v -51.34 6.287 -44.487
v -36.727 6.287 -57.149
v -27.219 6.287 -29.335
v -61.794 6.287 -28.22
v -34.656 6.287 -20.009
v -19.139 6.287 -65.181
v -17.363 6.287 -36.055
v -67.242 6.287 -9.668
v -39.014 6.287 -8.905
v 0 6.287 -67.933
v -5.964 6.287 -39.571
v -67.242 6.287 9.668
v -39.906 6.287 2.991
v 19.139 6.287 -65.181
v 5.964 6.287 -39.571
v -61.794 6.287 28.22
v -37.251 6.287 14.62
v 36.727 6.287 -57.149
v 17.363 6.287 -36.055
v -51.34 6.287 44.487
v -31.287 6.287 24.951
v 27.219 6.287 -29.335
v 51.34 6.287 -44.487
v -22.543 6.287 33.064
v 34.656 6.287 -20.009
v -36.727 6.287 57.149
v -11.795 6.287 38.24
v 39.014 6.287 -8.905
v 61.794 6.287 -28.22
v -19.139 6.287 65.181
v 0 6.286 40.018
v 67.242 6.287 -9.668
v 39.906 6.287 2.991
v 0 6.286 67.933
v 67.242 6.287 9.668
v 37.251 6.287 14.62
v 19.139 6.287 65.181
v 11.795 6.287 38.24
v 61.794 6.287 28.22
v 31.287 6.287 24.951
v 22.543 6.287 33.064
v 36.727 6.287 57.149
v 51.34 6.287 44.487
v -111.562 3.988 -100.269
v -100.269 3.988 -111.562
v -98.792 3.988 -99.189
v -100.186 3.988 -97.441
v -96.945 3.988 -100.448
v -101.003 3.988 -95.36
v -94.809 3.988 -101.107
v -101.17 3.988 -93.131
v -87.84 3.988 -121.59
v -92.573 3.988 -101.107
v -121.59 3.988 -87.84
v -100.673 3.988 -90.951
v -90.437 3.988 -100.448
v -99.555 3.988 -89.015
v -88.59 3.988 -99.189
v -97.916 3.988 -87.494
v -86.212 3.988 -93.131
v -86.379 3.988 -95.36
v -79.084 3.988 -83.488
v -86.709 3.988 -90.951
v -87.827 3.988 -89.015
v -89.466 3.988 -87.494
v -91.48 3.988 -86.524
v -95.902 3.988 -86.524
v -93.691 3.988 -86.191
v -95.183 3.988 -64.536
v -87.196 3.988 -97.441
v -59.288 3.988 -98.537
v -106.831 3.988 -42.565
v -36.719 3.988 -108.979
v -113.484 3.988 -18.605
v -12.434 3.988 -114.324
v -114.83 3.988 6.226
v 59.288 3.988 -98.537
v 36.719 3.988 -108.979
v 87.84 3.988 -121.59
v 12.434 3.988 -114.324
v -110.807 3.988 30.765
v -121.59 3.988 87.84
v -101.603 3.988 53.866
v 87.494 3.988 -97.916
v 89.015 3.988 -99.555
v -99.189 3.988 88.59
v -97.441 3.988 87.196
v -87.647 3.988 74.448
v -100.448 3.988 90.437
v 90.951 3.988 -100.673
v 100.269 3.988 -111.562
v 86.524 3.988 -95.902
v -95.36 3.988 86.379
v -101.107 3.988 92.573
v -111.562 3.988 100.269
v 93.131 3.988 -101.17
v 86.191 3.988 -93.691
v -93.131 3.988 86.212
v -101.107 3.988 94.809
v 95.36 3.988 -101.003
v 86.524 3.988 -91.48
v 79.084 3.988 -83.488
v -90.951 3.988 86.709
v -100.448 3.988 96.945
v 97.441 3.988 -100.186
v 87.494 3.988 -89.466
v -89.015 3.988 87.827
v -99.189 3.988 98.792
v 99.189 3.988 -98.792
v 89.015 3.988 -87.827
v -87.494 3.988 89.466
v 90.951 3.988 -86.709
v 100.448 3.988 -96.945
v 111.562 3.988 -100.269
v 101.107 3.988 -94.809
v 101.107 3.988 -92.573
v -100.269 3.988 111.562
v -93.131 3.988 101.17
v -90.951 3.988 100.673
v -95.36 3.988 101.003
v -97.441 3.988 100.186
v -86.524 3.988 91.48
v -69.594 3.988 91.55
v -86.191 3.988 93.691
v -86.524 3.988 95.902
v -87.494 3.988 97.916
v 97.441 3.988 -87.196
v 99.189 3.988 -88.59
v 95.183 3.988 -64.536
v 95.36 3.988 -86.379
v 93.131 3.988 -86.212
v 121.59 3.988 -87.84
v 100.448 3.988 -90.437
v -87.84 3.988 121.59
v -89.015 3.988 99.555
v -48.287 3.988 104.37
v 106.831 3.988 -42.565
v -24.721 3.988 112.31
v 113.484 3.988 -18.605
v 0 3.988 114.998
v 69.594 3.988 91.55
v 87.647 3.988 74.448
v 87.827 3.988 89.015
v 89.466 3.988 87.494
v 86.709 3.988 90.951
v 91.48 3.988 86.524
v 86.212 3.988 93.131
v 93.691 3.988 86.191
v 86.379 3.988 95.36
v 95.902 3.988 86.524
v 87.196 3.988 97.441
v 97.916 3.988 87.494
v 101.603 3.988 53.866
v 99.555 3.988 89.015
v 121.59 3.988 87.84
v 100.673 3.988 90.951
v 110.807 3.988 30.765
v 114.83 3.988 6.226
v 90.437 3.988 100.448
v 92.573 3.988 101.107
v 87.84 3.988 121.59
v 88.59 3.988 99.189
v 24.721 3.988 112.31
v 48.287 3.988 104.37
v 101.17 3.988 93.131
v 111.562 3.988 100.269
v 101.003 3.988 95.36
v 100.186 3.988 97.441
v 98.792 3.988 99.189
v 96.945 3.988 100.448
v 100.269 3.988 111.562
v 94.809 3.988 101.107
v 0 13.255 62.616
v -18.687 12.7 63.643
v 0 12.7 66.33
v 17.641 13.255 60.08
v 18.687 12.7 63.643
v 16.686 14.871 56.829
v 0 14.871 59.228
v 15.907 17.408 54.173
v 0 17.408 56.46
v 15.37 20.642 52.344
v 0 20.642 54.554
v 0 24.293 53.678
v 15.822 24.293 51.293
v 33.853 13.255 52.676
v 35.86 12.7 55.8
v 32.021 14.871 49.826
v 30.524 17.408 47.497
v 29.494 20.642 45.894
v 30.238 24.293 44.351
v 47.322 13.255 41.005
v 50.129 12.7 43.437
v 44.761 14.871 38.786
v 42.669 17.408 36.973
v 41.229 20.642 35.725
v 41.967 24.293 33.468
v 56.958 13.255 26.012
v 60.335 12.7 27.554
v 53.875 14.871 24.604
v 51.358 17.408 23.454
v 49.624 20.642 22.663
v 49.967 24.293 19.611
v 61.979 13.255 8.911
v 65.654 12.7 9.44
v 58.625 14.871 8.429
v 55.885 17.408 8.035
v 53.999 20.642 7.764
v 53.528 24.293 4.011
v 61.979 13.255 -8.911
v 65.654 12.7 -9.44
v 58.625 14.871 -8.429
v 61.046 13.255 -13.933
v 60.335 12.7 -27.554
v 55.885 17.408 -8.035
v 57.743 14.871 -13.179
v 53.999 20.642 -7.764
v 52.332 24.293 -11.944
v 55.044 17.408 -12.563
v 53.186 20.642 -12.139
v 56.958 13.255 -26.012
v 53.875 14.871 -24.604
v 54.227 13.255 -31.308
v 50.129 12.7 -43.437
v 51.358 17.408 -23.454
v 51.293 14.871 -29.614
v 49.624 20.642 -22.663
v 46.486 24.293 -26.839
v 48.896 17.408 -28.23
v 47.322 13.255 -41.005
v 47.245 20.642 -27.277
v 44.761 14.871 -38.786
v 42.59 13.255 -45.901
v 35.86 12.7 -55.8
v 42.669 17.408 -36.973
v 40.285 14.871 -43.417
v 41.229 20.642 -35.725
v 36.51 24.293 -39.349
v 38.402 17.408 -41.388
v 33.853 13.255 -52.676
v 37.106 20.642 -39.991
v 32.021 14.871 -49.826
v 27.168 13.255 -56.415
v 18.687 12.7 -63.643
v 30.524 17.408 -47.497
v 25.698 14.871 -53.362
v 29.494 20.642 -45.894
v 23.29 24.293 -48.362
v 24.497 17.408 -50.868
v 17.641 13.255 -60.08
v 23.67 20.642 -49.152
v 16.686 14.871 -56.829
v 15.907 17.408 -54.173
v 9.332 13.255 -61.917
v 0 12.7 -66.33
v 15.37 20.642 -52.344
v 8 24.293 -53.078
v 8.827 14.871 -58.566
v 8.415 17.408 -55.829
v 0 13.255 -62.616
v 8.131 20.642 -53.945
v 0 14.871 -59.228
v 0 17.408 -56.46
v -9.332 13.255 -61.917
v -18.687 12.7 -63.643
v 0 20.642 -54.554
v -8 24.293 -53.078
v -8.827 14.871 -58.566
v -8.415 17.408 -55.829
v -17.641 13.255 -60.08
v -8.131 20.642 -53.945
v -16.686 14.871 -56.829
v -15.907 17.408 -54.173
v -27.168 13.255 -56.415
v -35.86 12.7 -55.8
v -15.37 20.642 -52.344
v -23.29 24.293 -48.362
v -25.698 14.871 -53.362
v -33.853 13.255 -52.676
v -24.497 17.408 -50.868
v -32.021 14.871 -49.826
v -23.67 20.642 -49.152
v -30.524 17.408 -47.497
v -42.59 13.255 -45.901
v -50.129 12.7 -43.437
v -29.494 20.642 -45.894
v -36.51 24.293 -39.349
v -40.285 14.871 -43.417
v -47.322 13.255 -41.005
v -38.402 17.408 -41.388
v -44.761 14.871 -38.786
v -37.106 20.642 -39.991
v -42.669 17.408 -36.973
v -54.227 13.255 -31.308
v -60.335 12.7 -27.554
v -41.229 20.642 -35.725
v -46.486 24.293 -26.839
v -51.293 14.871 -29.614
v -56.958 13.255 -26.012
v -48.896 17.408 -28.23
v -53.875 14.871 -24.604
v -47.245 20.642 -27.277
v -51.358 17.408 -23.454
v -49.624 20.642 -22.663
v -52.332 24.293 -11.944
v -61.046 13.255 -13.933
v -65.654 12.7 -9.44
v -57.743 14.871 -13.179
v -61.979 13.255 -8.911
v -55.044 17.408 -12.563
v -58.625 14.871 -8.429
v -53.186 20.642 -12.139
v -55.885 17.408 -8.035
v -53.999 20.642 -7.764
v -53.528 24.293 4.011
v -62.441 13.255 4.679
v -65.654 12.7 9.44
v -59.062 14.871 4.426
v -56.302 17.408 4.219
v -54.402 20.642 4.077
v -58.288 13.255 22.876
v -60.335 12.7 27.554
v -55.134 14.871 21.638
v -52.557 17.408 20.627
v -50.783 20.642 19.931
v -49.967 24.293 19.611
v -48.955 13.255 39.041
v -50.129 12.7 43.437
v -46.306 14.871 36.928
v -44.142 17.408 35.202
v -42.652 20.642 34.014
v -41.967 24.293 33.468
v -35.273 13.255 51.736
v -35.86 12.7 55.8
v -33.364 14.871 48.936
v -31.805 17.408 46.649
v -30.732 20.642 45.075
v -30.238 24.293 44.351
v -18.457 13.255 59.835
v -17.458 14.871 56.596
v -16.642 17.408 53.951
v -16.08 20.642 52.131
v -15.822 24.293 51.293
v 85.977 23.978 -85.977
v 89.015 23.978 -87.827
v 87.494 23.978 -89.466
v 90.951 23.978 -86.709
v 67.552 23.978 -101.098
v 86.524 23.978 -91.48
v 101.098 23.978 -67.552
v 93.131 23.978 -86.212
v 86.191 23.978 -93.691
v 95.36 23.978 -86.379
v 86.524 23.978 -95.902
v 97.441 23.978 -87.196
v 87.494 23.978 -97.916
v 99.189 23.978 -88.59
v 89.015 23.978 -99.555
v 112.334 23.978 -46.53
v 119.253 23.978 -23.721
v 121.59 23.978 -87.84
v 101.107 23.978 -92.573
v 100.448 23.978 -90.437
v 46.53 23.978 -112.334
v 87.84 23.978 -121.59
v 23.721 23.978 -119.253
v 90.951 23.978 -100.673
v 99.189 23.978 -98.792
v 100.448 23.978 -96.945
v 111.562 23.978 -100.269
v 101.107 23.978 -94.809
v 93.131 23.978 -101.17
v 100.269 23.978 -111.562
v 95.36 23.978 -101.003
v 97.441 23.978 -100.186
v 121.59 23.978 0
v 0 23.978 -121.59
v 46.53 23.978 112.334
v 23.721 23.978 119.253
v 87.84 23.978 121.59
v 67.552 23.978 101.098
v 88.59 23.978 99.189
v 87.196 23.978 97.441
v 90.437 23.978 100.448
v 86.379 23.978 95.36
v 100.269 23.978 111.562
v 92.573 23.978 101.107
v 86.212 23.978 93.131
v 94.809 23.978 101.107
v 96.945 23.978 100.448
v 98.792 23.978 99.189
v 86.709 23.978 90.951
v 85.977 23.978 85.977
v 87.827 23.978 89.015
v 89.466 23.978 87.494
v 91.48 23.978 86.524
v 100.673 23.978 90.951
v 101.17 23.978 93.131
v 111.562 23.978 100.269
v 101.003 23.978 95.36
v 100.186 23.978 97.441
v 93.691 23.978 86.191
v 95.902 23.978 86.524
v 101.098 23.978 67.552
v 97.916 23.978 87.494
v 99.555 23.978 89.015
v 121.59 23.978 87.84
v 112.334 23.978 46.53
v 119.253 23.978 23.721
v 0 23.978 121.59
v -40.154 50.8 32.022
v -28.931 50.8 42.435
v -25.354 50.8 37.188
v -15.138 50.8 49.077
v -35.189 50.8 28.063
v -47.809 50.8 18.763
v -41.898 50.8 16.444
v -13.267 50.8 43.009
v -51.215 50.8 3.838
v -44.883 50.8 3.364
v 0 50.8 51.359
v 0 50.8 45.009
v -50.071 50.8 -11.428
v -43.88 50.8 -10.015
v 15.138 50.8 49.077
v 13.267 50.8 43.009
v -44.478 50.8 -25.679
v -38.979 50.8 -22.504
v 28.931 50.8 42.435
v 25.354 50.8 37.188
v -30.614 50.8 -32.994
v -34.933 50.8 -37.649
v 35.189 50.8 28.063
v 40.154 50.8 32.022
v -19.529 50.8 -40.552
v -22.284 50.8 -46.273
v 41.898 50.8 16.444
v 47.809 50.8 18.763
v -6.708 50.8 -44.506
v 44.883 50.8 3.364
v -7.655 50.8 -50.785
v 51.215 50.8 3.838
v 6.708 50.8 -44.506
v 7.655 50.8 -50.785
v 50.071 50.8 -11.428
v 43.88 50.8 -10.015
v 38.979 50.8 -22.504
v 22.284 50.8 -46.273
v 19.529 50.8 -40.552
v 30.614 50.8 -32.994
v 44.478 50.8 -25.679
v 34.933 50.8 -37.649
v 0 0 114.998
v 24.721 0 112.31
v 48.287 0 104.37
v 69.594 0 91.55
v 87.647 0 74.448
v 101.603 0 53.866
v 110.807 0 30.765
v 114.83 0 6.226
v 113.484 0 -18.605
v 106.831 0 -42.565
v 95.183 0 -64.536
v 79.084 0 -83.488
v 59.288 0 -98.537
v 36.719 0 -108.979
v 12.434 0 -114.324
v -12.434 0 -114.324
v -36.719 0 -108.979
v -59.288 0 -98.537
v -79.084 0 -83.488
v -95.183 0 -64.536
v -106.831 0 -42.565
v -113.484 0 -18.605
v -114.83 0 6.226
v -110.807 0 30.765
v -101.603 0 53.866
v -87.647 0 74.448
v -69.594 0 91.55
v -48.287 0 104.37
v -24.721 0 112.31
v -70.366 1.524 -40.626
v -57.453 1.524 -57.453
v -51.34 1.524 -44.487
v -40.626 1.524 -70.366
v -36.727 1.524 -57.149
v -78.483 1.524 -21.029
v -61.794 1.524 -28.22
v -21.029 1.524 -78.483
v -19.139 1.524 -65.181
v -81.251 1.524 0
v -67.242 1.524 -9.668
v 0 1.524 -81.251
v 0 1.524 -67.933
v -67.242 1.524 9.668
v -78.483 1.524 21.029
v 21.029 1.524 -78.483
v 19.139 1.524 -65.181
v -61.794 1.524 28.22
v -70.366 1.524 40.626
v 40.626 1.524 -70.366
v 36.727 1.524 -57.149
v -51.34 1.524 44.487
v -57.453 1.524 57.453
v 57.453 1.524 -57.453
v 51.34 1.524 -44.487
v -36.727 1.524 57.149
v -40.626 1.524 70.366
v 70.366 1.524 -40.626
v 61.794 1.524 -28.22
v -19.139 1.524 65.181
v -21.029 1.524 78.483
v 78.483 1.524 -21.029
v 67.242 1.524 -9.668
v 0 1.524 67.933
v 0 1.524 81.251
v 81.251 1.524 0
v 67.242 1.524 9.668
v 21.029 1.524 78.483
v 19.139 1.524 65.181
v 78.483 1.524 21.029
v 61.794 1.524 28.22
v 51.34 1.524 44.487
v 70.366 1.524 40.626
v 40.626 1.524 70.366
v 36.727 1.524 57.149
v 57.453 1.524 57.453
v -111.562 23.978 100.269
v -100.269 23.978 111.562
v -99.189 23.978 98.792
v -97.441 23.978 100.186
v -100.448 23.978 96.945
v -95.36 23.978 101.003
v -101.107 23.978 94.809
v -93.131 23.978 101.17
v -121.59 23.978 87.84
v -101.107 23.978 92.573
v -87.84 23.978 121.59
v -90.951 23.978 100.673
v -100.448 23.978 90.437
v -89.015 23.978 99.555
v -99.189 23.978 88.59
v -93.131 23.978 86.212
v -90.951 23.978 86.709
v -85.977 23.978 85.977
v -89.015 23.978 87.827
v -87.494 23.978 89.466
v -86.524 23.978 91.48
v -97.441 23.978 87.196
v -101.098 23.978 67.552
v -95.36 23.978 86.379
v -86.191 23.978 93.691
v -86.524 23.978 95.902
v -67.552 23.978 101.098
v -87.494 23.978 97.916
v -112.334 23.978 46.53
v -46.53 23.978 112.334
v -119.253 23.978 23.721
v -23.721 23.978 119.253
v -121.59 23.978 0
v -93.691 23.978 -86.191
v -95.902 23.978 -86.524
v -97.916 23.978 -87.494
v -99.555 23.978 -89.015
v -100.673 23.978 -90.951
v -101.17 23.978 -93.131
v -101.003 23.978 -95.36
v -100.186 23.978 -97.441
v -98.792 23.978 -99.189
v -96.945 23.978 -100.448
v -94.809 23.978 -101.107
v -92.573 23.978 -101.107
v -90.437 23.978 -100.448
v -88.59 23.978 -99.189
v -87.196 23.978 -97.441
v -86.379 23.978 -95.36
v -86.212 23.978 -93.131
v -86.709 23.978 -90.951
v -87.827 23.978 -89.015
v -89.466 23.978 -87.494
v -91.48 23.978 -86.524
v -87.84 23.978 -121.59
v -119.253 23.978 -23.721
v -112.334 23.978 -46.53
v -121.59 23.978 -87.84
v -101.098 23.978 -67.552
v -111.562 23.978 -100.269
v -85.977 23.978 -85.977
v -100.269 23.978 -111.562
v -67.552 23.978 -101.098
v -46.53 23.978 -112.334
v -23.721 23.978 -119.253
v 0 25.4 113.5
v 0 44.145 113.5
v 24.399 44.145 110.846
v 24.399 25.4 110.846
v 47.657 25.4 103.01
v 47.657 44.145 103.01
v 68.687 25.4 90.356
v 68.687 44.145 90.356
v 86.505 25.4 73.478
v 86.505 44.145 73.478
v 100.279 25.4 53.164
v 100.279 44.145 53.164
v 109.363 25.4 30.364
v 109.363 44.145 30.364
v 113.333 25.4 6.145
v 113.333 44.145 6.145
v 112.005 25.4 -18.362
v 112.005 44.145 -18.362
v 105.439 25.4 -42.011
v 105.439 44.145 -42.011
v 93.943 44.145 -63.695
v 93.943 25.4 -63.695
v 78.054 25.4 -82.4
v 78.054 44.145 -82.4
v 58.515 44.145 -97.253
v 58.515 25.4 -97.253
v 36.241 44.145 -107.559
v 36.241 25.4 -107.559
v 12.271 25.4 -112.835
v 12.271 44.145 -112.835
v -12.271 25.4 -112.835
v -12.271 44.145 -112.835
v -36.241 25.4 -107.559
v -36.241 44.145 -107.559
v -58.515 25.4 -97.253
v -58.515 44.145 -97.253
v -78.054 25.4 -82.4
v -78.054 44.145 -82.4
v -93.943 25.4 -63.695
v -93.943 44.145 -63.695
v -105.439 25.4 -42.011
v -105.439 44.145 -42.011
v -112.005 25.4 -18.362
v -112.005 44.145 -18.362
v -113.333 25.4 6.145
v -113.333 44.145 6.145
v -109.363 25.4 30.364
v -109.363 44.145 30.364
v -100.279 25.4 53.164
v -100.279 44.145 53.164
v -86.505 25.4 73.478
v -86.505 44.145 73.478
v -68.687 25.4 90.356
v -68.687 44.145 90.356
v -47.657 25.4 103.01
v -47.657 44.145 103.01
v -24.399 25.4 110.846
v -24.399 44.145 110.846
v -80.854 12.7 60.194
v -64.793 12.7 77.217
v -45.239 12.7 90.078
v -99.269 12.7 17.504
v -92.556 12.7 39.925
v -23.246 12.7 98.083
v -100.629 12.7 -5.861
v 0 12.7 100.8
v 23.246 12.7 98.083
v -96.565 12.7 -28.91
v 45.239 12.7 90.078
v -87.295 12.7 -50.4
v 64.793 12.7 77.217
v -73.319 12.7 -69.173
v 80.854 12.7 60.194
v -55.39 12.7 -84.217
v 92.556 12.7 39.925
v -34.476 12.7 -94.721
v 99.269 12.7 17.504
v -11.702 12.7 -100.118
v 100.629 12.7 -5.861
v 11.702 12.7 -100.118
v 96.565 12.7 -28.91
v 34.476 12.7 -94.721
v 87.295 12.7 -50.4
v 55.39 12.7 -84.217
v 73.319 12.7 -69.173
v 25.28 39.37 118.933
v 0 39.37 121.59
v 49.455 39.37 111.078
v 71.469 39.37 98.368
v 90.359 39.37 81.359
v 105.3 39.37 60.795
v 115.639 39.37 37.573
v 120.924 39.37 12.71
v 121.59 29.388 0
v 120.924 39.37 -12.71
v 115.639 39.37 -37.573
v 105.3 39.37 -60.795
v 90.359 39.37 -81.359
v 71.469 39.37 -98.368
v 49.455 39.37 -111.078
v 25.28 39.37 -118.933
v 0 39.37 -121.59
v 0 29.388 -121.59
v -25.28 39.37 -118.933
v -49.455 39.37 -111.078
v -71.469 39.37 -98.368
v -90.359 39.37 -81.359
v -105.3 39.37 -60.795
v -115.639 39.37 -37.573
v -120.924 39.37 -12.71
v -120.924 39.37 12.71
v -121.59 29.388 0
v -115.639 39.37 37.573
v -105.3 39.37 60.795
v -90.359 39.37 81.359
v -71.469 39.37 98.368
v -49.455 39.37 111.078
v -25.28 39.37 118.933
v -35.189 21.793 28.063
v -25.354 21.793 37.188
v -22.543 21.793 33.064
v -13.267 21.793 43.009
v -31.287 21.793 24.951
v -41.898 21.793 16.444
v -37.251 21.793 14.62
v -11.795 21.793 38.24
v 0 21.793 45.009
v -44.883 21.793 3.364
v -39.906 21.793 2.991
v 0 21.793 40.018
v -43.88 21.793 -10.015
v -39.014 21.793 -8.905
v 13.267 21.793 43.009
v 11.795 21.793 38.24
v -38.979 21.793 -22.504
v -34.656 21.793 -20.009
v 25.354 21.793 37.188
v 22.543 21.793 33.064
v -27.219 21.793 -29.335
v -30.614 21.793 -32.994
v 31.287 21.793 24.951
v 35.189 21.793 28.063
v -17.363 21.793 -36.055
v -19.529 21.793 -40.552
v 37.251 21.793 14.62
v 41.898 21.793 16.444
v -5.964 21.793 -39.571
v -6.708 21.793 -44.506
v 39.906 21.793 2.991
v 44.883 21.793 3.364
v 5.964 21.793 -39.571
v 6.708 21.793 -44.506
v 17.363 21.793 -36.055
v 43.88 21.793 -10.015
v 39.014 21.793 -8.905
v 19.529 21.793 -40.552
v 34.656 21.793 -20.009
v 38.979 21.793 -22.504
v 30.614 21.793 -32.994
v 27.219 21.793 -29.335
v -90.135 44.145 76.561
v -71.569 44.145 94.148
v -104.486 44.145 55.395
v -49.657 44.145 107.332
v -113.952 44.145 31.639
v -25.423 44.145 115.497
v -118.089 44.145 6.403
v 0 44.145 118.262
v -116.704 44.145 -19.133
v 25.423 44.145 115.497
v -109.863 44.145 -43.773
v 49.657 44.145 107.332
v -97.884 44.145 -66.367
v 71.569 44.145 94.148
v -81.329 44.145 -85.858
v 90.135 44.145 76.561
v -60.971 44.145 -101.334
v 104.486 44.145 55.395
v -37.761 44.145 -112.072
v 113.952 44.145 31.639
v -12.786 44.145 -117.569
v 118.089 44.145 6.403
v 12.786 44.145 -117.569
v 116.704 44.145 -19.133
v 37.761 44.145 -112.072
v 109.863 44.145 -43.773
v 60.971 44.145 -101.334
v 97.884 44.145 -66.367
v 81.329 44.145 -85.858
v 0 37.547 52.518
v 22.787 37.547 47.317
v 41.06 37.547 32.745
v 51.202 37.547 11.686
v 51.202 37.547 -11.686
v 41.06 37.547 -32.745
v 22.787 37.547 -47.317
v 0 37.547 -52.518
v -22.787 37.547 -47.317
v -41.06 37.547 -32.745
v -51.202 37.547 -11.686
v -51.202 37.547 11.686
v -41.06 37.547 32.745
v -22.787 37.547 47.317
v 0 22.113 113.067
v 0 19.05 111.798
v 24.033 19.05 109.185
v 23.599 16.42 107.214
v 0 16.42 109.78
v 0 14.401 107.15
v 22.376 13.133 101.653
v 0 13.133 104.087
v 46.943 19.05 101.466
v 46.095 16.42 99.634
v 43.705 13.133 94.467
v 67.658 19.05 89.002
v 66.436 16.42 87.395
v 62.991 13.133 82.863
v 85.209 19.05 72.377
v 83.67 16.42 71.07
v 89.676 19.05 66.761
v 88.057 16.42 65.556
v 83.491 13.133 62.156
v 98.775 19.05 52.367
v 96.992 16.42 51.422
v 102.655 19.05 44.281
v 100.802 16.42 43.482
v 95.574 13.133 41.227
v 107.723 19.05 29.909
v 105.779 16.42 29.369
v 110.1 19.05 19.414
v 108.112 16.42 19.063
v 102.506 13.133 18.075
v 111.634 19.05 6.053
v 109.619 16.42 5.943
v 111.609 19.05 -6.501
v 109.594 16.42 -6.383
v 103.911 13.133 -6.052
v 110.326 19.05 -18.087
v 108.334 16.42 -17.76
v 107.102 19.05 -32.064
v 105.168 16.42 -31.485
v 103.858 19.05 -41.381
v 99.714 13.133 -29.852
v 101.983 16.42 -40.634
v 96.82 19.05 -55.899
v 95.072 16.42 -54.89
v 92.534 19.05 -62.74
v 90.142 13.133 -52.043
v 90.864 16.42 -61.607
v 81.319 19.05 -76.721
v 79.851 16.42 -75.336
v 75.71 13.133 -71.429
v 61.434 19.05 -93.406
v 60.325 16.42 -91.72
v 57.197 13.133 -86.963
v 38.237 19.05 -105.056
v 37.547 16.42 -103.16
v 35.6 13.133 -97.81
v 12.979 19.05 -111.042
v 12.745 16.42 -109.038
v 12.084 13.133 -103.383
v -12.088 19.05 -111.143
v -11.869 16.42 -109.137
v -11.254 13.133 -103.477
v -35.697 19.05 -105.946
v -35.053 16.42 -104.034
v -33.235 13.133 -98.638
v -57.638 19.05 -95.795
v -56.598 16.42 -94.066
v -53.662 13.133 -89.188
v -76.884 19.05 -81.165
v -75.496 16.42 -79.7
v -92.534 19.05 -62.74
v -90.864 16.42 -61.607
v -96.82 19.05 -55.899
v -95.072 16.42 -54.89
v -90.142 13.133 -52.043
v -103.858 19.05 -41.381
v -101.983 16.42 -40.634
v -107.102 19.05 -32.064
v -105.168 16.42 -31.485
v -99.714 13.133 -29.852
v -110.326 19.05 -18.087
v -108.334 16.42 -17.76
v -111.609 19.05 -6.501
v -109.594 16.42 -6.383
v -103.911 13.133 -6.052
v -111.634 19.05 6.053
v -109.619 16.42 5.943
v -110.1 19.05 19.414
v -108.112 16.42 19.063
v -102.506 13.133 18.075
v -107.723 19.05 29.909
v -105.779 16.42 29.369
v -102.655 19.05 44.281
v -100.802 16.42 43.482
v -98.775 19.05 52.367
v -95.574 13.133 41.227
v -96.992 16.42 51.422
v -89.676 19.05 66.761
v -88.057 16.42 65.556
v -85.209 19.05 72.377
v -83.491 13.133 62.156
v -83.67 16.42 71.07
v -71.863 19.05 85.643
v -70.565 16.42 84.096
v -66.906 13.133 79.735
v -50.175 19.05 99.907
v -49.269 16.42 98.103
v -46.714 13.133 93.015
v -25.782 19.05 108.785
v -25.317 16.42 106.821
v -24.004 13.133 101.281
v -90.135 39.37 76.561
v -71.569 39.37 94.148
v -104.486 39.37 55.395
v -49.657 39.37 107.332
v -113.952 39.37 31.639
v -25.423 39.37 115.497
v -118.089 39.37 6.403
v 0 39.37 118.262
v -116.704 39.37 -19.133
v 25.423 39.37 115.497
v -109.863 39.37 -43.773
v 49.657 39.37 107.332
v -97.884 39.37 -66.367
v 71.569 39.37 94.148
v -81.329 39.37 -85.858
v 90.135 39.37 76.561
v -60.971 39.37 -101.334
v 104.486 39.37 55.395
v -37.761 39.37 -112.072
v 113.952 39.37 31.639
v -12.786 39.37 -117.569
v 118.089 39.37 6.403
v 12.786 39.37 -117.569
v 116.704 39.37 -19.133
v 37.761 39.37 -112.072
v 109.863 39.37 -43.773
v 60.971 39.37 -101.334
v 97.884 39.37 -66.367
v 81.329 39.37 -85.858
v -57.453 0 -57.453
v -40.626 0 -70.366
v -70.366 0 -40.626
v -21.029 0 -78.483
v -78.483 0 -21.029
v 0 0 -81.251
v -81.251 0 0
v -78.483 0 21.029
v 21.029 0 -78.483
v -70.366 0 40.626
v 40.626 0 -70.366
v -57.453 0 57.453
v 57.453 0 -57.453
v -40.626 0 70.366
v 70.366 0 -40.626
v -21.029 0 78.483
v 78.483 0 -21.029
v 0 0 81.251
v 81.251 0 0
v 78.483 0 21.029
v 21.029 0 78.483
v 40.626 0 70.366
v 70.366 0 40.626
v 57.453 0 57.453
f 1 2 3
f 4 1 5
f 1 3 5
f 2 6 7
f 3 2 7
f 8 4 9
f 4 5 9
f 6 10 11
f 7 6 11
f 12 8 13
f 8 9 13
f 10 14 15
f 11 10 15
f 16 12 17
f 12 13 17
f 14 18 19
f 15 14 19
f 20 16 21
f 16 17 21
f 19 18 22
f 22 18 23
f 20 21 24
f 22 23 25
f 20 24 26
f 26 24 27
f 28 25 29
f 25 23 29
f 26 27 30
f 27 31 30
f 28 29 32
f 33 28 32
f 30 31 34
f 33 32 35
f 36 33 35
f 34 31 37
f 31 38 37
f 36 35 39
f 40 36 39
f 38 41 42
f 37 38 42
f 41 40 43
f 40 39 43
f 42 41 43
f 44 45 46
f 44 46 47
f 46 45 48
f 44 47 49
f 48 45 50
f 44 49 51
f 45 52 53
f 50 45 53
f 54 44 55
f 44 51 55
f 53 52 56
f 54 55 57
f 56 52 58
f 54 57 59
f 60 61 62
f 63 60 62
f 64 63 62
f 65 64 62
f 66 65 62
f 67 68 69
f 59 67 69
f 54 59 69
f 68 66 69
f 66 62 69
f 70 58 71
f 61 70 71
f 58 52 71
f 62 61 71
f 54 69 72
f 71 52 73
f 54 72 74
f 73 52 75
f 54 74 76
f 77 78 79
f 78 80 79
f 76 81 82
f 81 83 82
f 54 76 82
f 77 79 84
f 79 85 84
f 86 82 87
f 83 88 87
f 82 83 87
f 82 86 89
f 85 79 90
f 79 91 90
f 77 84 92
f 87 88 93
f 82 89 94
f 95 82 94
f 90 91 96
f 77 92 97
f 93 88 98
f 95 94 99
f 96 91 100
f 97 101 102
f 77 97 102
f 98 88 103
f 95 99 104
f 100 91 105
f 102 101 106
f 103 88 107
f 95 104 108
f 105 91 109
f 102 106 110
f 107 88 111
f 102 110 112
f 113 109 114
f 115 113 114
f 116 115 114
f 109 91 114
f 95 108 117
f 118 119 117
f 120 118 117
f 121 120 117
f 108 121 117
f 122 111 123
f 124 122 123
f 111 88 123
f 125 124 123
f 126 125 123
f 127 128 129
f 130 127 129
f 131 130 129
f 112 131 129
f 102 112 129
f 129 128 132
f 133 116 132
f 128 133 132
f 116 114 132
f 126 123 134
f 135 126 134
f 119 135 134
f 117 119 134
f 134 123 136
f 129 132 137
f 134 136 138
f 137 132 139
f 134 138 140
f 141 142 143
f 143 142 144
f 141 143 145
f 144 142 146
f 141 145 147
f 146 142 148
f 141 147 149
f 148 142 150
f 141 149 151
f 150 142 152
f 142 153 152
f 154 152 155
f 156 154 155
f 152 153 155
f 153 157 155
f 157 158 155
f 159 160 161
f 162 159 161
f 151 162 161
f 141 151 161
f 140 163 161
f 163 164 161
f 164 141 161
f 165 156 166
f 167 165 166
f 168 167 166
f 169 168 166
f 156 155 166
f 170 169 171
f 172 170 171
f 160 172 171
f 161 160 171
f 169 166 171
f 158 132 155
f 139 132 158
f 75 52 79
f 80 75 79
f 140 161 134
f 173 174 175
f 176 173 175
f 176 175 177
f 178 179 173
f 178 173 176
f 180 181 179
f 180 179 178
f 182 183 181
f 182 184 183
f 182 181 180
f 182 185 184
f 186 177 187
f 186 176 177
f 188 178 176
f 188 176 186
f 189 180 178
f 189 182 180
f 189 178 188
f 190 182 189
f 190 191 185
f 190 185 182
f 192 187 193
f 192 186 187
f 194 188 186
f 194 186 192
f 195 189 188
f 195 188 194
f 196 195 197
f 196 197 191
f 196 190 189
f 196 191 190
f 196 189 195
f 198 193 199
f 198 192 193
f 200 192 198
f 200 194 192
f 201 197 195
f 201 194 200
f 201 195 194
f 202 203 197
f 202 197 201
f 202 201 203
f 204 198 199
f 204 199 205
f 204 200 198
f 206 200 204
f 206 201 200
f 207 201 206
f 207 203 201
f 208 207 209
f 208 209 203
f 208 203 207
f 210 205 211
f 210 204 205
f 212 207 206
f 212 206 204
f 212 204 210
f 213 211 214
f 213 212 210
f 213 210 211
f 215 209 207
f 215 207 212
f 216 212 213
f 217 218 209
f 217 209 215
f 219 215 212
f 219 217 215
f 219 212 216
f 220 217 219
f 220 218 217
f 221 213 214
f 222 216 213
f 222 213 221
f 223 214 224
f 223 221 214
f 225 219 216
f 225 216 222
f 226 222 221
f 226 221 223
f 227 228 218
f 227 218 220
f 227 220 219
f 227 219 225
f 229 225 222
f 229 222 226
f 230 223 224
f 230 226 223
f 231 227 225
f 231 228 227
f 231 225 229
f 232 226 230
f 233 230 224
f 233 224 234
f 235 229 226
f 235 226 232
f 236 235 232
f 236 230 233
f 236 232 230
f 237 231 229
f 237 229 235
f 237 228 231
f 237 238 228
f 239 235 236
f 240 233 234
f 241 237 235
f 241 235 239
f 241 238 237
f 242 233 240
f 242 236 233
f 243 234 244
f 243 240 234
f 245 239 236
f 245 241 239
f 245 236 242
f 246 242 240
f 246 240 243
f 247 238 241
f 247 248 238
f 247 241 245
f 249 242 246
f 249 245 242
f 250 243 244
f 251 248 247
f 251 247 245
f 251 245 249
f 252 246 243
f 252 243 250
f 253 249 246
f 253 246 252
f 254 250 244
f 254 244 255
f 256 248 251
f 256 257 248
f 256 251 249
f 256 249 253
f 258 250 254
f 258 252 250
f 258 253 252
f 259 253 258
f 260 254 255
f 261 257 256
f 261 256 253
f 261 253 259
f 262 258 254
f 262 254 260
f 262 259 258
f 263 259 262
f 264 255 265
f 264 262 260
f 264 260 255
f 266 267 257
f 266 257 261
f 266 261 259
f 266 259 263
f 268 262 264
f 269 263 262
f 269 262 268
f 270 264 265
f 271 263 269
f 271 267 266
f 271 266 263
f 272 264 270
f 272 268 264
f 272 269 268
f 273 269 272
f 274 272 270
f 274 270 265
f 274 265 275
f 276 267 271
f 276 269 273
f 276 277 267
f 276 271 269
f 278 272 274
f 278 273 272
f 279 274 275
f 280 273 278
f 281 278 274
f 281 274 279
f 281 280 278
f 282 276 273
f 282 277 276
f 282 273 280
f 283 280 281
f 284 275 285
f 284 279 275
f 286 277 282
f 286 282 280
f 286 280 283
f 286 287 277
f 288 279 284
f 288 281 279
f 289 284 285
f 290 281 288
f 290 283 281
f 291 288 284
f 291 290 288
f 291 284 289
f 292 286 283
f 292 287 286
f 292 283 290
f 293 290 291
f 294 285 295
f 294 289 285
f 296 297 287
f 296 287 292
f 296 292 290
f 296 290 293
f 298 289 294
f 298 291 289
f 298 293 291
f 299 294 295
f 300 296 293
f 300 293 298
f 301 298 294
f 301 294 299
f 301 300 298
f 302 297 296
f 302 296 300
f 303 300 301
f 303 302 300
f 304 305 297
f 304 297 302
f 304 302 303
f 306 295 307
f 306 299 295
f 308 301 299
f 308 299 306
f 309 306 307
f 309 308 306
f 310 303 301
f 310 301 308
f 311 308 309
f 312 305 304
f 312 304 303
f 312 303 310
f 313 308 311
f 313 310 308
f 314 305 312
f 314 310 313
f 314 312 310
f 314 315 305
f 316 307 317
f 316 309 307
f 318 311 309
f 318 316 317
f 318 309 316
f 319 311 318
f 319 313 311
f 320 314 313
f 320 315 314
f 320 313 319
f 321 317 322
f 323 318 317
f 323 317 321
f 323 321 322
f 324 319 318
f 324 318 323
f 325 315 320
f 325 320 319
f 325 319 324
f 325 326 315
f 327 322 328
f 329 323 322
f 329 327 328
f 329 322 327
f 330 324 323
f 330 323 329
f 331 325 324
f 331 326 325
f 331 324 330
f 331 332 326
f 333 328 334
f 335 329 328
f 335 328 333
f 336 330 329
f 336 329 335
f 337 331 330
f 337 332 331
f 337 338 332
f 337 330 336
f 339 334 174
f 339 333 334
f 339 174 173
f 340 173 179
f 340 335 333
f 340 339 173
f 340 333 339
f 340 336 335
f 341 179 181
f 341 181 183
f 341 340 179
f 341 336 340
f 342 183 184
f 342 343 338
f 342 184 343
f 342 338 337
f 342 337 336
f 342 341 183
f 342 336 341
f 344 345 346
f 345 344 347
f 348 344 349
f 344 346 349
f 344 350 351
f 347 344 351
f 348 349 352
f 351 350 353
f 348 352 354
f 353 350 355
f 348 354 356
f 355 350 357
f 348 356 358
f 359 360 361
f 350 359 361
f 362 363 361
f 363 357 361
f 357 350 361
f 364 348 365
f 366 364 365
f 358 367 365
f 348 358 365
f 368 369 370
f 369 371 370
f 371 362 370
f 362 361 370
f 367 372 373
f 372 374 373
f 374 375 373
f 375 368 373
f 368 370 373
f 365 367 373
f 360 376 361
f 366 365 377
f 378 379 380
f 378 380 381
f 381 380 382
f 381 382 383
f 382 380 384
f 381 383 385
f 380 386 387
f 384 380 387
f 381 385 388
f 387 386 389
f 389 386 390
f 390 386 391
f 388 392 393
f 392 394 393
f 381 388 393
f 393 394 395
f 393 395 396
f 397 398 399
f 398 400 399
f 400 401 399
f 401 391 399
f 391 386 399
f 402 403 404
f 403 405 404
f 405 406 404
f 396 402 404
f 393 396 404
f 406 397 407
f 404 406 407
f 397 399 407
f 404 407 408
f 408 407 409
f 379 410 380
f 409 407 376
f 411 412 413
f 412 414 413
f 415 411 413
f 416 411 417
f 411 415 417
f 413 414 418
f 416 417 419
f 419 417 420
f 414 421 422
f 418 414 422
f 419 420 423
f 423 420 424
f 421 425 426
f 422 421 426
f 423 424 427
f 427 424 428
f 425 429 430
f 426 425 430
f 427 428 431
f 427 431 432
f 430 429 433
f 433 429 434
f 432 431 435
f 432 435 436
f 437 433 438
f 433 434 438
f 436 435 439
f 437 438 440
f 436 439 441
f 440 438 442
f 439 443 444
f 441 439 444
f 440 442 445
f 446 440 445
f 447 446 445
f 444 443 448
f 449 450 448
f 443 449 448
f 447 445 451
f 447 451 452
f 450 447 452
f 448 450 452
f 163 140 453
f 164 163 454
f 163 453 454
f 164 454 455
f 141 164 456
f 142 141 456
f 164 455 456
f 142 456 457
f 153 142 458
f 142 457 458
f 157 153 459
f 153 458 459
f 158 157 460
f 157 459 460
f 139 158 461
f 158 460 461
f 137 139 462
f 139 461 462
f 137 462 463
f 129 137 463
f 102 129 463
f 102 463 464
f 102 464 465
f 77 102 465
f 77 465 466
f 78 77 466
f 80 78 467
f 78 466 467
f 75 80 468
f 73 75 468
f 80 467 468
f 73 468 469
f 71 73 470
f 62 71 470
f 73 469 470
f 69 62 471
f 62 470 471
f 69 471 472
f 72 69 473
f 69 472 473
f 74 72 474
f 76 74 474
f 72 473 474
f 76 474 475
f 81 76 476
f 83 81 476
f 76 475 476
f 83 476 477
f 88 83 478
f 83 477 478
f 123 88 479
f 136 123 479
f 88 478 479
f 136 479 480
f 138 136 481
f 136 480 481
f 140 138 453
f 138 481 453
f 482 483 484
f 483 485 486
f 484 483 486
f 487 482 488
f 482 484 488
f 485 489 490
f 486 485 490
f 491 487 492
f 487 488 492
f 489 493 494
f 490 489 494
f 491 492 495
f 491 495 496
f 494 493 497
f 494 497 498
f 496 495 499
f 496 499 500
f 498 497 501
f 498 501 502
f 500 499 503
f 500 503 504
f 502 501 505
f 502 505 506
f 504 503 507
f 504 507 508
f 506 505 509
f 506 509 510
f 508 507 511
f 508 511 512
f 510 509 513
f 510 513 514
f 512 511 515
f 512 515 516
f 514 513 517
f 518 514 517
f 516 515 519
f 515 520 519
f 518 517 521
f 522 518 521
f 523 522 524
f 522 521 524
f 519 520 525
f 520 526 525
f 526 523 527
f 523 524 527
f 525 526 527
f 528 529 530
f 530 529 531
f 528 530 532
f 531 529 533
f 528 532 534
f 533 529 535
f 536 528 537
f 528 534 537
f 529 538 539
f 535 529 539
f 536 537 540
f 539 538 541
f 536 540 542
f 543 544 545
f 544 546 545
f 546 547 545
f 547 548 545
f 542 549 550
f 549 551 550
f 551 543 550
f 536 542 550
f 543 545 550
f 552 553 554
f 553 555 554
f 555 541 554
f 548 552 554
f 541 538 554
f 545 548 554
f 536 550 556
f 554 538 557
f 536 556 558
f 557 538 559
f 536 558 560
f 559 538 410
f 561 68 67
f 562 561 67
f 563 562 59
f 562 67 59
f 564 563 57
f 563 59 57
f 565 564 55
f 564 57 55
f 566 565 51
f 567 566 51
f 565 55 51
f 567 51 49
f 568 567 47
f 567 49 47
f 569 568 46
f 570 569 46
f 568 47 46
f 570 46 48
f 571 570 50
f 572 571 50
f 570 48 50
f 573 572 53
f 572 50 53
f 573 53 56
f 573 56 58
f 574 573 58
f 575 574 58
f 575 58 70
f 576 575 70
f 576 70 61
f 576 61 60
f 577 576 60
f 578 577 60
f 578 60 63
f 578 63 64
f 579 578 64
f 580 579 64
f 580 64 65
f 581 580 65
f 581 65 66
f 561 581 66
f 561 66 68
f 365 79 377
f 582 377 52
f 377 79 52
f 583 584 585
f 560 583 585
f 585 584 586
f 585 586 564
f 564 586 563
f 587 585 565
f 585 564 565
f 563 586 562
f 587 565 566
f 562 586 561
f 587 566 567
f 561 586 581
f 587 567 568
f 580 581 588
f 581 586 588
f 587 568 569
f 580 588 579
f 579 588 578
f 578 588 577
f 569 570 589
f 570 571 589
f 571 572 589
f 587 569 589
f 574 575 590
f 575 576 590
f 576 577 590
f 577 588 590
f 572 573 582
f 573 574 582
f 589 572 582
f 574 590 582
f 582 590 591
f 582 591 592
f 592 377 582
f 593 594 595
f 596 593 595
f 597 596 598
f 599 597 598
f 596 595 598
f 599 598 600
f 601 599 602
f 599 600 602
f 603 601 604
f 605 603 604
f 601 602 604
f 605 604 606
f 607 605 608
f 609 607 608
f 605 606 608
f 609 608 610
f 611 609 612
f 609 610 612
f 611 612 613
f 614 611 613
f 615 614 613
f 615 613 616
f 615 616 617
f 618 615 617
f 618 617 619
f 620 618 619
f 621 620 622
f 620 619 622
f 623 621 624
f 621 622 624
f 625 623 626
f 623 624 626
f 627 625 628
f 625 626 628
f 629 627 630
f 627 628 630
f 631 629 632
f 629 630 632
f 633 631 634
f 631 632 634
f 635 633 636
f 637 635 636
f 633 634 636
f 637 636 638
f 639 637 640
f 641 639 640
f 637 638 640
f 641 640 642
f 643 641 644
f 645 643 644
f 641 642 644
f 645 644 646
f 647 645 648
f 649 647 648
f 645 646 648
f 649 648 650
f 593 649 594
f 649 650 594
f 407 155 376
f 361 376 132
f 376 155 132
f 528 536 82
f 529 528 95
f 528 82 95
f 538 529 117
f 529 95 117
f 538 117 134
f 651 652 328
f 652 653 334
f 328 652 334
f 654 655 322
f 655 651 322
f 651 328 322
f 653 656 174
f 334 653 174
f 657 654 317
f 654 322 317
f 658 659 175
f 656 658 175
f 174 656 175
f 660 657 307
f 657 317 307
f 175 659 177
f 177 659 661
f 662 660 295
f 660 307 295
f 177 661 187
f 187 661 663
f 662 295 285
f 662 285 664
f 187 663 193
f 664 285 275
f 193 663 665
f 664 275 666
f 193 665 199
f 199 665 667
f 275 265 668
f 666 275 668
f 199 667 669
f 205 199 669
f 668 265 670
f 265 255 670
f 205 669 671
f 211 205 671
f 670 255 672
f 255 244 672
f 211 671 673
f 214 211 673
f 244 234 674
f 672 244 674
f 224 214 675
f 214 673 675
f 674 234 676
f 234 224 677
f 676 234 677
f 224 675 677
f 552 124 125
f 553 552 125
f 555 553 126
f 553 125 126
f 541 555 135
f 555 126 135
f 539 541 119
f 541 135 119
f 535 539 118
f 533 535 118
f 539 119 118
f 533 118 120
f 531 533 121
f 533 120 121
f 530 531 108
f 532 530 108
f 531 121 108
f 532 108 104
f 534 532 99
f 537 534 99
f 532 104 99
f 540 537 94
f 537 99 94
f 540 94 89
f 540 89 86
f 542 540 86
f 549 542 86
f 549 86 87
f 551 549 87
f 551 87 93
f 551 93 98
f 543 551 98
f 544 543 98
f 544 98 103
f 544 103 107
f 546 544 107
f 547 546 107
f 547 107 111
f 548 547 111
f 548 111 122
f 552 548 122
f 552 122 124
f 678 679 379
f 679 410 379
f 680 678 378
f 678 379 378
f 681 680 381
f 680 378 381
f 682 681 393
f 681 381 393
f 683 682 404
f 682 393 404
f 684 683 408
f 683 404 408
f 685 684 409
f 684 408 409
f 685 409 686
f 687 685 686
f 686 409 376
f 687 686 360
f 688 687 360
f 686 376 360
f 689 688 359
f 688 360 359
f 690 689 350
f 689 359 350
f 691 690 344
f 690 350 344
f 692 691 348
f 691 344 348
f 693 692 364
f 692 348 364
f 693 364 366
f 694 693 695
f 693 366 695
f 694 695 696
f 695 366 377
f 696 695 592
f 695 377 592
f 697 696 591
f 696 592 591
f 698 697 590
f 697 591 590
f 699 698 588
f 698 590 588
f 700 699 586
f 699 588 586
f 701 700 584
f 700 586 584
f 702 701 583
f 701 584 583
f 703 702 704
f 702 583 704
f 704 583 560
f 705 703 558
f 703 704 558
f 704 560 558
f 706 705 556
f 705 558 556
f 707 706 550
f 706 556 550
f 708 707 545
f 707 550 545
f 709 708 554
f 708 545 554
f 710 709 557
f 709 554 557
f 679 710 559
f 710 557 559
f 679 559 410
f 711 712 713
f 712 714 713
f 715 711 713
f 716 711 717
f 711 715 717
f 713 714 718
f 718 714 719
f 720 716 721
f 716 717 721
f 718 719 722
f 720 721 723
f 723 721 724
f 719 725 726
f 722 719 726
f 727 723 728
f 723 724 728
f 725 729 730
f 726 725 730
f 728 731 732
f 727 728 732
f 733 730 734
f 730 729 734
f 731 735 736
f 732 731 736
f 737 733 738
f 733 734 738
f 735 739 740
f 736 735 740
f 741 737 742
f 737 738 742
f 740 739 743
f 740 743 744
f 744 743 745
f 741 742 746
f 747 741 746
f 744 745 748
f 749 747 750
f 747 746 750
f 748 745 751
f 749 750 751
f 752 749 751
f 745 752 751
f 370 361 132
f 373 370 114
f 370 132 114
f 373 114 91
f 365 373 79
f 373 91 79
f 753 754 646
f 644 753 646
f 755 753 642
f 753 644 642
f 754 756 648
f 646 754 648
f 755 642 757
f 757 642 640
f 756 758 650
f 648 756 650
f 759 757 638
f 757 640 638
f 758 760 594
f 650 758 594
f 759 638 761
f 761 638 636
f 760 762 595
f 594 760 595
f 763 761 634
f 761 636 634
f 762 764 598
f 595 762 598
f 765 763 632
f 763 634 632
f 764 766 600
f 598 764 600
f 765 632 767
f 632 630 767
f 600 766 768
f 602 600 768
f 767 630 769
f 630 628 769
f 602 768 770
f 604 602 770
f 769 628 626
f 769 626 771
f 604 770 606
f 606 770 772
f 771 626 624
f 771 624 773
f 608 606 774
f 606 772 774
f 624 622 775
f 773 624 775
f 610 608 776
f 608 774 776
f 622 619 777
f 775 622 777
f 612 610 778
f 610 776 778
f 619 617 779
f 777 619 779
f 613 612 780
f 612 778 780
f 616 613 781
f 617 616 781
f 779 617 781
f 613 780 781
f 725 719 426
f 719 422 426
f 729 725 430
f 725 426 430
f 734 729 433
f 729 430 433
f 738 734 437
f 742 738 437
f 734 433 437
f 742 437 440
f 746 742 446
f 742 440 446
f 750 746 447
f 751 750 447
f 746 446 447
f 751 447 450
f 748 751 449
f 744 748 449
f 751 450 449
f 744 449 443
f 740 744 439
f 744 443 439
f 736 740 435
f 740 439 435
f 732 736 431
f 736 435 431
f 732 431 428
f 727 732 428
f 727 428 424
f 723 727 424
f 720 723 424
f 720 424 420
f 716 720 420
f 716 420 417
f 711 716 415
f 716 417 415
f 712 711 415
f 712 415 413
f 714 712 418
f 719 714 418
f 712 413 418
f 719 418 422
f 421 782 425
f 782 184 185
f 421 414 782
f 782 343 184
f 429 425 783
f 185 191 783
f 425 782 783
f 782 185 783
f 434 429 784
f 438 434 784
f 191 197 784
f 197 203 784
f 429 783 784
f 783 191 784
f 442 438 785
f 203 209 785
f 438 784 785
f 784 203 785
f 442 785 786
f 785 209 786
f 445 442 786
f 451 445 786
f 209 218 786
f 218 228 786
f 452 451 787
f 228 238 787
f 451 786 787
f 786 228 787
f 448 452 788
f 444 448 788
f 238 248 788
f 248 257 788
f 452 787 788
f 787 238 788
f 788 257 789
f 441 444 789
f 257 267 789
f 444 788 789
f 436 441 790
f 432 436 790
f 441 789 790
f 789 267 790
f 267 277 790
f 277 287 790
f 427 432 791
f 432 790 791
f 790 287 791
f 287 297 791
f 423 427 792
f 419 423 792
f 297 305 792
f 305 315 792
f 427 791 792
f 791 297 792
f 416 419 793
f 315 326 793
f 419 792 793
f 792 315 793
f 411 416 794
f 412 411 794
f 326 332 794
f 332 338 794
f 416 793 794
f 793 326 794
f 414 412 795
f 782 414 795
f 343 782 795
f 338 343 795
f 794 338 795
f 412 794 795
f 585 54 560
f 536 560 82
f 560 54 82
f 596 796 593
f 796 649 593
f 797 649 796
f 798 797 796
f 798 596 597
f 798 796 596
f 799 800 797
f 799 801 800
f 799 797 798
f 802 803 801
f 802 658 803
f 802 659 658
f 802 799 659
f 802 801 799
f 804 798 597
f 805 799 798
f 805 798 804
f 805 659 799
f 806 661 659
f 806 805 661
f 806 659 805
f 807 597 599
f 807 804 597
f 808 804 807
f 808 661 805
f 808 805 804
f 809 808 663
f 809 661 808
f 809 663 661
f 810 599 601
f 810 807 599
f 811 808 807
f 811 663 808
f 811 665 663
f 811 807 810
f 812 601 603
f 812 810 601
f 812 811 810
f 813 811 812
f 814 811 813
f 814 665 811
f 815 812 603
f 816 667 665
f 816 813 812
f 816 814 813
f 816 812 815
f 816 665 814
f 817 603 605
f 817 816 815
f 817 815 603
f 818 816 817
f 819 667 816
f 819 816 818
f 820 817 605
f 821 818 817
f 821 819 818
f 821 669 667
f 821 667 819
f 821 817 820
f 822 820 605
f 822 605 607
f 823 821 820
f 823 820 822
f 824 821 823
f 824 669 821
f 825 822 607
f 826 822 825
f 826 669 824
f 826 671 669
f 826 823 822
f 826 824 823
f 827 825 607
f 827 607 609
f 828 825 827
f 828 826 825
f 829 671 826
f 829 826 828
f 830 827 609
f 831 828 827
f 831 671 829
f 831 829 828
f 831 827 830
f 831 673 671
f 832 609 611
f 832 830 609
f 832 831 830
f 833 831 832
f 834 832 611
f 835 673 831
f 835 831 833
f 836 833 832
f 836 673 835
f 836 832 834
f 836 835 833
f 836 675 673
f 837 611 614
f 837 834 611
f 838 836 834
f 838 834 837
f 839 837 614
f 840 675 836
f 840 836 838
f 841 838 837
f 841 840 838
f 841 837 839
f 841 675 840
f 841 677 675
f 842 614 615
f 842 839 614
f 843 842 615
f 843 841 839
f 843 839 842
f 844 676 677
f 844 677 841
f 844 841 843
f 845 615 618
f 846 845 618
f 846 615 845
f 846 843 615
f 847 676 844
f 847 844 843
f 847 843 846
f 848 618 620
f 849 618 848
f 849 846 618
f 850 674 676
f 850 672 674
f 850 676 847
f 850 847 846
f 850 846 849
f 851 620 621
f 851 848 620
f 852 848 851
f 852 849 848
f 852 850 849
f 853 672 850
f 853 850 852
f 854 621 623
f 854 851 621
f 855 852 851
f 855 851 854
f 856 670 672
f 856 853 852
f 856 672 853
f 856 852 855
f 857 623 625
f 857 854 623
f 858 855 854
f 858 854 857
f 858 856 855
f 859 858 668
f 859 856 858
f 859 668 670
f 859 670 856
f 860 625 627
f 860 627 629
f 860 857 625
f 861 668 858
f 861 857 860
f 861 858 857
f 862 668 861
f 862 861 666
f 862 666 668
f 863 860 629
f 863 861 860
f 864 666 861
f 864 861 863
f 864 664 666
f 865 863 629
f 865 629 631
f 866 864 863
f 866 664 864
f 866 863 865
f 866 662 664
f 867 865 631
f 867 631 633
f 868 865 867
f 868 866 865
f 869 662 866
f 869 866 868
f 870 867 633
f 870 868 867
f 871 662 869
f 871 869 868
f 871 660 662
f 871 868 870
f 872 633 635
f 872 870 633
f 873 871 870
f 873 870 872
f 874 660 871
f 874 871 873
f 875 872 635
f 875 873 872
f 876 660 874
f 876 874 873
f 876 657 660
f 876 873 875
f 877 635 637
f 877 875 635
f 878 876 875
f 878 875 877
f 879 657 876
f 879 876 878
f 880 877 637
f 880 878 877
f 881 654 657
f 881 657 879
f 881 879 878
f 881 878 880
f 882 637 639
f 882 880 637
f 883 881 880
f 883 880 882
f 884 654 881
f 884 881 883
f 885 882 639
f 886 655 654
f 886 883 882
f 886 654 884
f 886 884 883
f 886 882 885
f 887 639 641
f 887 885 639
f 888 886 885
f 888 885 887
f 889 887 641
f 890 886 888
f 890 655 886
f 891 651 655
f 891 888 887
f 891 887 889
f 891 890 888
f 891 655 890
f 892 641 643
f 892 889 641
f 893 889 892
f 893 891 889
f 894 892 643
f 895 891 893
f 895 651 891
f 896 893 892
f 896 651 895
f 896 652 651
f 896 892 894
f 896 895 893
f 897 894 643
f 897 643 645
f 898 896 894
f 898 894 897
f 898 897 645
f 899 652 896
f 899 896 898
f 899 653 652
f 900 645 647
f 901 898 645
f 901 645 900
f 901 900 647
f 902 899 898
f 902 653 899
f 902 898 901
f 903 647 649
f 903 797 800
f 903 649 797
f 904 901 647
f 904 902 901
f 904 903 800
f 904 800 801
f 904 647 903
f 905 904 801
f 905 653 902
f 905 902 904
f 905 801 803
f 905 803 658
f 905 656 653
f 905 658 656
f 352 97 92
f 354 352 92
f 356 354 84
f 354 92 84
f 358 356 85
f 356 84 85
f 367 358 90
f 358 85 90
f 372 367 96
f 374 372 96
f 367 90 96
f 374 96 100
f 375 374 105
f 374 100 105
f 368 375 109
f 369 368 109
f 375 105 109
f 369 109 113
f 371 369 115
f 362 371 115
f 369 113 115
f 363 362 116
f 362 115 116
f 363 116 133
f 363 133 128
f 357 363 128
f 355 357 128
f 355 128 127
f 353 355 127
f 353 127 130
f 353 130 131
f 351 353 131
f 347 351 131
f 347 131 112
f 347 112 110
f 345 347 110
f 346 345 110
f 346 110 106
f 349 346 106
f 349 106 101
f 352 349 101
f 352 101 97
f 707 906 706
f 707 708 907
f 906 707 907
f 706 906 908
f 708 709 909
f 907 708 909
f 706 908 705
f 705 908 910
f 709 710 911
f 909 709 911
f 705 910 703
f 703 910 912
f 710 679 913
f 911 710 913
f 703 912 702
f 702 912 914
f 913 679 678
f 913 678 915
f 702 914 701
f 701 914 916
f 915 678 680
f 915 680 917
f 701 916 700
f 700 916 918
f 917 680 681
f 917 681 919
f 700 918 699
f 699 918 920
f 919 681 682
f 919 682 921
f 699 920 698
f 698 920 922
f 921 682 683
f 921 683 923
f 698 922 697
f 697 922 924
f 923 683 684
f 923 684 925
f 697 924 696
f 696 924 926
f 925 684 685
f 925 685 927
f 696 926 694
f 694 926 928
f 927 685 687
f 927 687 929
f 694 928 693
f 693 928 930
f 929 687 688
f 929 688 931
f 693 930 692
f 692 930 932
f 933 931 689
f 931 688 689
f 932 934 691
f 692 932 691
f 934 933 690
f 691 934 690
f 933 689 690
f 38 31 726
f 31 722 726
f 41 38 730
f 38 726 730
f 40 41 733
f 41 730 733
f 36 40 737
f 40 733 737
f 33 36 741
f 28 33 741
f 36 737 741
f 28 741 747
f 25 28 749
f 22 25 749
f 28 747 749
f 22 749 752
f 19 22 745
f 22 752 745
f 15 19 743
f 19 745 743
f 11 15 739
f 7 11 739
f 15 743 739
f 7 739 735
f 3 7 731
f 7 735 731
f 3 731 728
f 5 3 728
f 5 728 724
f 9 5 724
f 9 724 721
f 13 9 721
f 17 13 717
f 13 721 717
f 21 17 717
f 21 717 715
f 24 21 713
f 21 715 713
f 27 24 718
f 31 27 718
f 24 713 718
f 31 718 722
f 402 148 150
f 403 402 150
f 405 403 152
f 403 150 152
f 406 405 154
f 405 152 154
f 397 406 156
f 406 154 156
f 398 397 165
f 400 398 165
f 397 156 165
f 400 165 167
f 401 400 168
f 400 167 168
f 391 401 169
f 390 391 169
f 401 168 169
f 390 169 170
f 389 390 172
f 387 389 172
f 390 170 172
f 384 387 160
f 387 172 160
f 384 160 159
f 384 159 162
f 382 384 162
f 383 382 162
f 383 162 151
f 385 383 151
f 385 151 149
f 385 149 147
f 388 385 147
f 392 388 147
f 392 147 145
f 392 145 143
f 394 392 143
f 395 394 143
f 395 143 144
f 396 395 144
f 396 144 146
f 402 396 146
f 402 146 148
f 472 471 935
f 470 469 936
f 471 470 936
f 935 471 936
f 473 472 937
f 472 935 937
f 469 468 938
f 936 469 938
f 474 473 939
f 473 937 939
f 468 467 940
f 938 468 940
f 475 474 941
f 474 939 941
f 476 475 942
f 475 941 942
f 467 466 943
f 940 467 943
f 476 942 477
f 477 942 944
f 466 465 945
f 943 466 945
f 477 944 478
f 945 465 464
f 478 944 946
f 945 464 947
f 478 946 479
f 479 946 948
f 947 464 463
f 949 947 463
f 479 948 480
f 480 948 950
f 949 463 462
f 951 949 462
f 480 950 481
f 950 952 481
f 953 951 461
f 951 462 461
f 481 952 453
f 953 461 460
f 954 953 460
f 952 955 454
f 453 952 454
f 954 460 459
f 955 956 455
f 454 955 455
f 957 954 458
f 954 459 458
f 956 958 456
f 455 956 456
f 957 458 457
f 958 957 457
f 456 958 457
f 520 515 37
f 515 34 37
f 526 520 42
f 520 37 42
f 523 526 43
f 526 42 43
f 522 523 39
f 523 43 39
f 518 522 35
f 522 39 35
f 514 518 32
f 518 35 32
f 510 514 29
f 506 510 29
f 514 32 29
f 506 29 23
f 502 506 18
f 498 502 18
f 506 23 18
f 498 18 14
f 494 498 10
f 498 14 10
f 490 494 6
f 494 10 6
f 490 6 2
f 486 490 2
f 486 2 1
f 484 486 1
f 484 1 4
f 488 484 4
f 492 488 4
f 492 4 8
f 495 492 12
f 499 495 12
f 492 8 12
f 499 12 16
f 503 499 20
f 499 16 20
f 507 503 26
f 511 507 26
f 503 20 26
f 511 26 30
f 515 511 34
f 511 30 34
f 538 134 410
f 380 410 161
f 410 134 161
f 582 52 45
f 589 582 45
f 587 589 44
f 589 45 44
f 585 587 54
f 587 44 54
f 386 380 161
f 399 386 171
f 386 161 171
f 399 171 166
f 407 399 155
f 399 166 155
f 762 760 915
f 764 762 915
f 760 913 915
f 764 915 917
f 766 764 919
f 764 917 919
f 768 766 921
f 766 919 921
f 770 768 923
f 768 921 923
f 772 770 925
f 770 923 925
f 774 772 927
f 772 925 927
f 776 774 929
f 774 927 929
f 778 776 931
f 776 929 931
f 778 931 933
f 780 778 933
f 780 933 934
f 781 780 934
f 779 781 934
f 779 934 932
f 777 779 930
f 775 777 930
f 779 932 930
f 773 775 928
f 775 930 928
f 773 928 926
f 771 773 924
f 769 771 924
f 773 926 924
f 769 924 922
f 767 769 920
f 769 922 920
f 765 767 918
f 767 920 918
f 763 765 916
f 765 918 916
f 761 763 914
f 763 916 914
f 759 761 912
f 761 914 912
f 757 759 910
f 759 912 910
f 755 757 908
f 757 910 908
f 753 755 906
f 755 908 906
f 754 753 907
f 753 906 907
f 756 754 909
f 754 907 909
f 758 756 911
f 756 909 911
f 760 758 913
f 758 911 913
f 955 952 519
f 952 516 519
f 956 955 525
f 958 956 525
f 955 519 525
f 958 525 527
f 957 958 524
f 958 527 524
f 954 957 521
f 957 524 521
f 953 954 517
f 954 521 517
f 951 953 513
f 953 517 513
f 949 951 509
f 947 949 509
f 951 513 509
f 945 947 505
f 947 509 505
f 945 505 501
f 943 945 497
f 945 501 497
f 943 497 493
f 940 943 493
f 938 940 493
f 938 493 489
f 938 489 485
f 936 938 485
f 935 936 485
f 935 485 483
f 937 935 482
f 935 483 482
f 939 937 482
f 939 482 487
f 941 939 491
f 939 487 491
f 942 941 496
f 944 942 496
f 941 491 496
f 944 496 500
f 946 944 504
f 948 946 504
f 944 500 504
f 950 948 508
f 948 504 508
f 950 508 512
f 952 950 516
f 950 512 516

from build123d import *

# Parameters (mm, degrees)
F2_R            = 7.5
F3_DEPTH        = 25.4
F3_COPIES_COUNT = 4
F4_R            = 12.7


# Not quite as in the source:
# - a pattern or mirror of a feature is missing from the dataset's text; its kind, count and spacing are read off the source's solid


with BuildPart() as f1:
    # F0 (on Right) → F1 (revolve)
    with BuildSketch(Plane.YZ):
        Polygon((23.9776, 150), (3.9878, 150), (3.9878, 114.9985), (0, 114.9985), (0, 81.2514126301), (1.524, 81.2514126301), (1.524, 67.9329782724), (6.2865, 67.9329782724), (6.2865, 40.0177), (21.7932, 40.0177), (21.7932, 45.0088), (50.8, 45.0088), (50.8, 51.3588), (12.7, 54.6921180803), (12.7, 113.4999), (44.1452, 113.4999), (44.1452, 118.2624), (39.37, 118.2624), (39.37, 121.5898), (23.9776, 121.5898), align=None)
    revolve(axis=Axis((0, 63.4710703942, 0), (0, 1, 0)))

    # F2 (on face) → F3 (cut)
    with BuildSketch(Plane.XZ.offset(-3.9878)):
        with Locations((-93.6910121111, 93.6910121111)):
            Circle(F2_R)
        with BuildLine():
            Line((-111.0230386257, 169.054677367), (-111.0230386257, 121.5898))
            Line((-111.0230386257, 121.5898), (-87.8403127041, 121.5898))
            ThreePointArc((-87.8403127041, 121.5898), (0, 150), (87.8403127041, 121.5898))
            Line((87.8403127041, 121.5898), (147.7070748806, 121.5898))
            Line((147.7070748806, 121.5898), (147.7070748806, 169.054677367))
            Line((147.7070748806, 169.054677367), (-111.0230386257, 169.054677367))
        make_face()
        with BuildLine():
            ThreePointArc((87.8403127041, 121.5898), (0, 150), (-87.8403127041, 121.5898))
            Line((-87.8403127041, 121.5898), (87.8403127041, 121.5898))
        make_face()
    f3 = extrude(amount=-F3_DEPTH, mode=Mode.SUBTRACT)

    # F3_copies: F3 ×4 about axis
    f3_copies_axis = Axis((0, 0, 0), (0, 1, 0))
    for i in range(1, F3_COPIES_COUNT):
        add(f3.rotate(f3_copies_axis, i * 360 / F3_COPIES_COUNT), mode=Mode.SUBTRACT)

    # F4
    f4_edges = [f1.edges().sort_by_distance(p)[0] for p in [
        (0, 12.7, -113.4999),
        (0, 12.7, -54.692118),
    ]]
    fillet(f4_edges, radius=F4_R)


solid = f1.part
